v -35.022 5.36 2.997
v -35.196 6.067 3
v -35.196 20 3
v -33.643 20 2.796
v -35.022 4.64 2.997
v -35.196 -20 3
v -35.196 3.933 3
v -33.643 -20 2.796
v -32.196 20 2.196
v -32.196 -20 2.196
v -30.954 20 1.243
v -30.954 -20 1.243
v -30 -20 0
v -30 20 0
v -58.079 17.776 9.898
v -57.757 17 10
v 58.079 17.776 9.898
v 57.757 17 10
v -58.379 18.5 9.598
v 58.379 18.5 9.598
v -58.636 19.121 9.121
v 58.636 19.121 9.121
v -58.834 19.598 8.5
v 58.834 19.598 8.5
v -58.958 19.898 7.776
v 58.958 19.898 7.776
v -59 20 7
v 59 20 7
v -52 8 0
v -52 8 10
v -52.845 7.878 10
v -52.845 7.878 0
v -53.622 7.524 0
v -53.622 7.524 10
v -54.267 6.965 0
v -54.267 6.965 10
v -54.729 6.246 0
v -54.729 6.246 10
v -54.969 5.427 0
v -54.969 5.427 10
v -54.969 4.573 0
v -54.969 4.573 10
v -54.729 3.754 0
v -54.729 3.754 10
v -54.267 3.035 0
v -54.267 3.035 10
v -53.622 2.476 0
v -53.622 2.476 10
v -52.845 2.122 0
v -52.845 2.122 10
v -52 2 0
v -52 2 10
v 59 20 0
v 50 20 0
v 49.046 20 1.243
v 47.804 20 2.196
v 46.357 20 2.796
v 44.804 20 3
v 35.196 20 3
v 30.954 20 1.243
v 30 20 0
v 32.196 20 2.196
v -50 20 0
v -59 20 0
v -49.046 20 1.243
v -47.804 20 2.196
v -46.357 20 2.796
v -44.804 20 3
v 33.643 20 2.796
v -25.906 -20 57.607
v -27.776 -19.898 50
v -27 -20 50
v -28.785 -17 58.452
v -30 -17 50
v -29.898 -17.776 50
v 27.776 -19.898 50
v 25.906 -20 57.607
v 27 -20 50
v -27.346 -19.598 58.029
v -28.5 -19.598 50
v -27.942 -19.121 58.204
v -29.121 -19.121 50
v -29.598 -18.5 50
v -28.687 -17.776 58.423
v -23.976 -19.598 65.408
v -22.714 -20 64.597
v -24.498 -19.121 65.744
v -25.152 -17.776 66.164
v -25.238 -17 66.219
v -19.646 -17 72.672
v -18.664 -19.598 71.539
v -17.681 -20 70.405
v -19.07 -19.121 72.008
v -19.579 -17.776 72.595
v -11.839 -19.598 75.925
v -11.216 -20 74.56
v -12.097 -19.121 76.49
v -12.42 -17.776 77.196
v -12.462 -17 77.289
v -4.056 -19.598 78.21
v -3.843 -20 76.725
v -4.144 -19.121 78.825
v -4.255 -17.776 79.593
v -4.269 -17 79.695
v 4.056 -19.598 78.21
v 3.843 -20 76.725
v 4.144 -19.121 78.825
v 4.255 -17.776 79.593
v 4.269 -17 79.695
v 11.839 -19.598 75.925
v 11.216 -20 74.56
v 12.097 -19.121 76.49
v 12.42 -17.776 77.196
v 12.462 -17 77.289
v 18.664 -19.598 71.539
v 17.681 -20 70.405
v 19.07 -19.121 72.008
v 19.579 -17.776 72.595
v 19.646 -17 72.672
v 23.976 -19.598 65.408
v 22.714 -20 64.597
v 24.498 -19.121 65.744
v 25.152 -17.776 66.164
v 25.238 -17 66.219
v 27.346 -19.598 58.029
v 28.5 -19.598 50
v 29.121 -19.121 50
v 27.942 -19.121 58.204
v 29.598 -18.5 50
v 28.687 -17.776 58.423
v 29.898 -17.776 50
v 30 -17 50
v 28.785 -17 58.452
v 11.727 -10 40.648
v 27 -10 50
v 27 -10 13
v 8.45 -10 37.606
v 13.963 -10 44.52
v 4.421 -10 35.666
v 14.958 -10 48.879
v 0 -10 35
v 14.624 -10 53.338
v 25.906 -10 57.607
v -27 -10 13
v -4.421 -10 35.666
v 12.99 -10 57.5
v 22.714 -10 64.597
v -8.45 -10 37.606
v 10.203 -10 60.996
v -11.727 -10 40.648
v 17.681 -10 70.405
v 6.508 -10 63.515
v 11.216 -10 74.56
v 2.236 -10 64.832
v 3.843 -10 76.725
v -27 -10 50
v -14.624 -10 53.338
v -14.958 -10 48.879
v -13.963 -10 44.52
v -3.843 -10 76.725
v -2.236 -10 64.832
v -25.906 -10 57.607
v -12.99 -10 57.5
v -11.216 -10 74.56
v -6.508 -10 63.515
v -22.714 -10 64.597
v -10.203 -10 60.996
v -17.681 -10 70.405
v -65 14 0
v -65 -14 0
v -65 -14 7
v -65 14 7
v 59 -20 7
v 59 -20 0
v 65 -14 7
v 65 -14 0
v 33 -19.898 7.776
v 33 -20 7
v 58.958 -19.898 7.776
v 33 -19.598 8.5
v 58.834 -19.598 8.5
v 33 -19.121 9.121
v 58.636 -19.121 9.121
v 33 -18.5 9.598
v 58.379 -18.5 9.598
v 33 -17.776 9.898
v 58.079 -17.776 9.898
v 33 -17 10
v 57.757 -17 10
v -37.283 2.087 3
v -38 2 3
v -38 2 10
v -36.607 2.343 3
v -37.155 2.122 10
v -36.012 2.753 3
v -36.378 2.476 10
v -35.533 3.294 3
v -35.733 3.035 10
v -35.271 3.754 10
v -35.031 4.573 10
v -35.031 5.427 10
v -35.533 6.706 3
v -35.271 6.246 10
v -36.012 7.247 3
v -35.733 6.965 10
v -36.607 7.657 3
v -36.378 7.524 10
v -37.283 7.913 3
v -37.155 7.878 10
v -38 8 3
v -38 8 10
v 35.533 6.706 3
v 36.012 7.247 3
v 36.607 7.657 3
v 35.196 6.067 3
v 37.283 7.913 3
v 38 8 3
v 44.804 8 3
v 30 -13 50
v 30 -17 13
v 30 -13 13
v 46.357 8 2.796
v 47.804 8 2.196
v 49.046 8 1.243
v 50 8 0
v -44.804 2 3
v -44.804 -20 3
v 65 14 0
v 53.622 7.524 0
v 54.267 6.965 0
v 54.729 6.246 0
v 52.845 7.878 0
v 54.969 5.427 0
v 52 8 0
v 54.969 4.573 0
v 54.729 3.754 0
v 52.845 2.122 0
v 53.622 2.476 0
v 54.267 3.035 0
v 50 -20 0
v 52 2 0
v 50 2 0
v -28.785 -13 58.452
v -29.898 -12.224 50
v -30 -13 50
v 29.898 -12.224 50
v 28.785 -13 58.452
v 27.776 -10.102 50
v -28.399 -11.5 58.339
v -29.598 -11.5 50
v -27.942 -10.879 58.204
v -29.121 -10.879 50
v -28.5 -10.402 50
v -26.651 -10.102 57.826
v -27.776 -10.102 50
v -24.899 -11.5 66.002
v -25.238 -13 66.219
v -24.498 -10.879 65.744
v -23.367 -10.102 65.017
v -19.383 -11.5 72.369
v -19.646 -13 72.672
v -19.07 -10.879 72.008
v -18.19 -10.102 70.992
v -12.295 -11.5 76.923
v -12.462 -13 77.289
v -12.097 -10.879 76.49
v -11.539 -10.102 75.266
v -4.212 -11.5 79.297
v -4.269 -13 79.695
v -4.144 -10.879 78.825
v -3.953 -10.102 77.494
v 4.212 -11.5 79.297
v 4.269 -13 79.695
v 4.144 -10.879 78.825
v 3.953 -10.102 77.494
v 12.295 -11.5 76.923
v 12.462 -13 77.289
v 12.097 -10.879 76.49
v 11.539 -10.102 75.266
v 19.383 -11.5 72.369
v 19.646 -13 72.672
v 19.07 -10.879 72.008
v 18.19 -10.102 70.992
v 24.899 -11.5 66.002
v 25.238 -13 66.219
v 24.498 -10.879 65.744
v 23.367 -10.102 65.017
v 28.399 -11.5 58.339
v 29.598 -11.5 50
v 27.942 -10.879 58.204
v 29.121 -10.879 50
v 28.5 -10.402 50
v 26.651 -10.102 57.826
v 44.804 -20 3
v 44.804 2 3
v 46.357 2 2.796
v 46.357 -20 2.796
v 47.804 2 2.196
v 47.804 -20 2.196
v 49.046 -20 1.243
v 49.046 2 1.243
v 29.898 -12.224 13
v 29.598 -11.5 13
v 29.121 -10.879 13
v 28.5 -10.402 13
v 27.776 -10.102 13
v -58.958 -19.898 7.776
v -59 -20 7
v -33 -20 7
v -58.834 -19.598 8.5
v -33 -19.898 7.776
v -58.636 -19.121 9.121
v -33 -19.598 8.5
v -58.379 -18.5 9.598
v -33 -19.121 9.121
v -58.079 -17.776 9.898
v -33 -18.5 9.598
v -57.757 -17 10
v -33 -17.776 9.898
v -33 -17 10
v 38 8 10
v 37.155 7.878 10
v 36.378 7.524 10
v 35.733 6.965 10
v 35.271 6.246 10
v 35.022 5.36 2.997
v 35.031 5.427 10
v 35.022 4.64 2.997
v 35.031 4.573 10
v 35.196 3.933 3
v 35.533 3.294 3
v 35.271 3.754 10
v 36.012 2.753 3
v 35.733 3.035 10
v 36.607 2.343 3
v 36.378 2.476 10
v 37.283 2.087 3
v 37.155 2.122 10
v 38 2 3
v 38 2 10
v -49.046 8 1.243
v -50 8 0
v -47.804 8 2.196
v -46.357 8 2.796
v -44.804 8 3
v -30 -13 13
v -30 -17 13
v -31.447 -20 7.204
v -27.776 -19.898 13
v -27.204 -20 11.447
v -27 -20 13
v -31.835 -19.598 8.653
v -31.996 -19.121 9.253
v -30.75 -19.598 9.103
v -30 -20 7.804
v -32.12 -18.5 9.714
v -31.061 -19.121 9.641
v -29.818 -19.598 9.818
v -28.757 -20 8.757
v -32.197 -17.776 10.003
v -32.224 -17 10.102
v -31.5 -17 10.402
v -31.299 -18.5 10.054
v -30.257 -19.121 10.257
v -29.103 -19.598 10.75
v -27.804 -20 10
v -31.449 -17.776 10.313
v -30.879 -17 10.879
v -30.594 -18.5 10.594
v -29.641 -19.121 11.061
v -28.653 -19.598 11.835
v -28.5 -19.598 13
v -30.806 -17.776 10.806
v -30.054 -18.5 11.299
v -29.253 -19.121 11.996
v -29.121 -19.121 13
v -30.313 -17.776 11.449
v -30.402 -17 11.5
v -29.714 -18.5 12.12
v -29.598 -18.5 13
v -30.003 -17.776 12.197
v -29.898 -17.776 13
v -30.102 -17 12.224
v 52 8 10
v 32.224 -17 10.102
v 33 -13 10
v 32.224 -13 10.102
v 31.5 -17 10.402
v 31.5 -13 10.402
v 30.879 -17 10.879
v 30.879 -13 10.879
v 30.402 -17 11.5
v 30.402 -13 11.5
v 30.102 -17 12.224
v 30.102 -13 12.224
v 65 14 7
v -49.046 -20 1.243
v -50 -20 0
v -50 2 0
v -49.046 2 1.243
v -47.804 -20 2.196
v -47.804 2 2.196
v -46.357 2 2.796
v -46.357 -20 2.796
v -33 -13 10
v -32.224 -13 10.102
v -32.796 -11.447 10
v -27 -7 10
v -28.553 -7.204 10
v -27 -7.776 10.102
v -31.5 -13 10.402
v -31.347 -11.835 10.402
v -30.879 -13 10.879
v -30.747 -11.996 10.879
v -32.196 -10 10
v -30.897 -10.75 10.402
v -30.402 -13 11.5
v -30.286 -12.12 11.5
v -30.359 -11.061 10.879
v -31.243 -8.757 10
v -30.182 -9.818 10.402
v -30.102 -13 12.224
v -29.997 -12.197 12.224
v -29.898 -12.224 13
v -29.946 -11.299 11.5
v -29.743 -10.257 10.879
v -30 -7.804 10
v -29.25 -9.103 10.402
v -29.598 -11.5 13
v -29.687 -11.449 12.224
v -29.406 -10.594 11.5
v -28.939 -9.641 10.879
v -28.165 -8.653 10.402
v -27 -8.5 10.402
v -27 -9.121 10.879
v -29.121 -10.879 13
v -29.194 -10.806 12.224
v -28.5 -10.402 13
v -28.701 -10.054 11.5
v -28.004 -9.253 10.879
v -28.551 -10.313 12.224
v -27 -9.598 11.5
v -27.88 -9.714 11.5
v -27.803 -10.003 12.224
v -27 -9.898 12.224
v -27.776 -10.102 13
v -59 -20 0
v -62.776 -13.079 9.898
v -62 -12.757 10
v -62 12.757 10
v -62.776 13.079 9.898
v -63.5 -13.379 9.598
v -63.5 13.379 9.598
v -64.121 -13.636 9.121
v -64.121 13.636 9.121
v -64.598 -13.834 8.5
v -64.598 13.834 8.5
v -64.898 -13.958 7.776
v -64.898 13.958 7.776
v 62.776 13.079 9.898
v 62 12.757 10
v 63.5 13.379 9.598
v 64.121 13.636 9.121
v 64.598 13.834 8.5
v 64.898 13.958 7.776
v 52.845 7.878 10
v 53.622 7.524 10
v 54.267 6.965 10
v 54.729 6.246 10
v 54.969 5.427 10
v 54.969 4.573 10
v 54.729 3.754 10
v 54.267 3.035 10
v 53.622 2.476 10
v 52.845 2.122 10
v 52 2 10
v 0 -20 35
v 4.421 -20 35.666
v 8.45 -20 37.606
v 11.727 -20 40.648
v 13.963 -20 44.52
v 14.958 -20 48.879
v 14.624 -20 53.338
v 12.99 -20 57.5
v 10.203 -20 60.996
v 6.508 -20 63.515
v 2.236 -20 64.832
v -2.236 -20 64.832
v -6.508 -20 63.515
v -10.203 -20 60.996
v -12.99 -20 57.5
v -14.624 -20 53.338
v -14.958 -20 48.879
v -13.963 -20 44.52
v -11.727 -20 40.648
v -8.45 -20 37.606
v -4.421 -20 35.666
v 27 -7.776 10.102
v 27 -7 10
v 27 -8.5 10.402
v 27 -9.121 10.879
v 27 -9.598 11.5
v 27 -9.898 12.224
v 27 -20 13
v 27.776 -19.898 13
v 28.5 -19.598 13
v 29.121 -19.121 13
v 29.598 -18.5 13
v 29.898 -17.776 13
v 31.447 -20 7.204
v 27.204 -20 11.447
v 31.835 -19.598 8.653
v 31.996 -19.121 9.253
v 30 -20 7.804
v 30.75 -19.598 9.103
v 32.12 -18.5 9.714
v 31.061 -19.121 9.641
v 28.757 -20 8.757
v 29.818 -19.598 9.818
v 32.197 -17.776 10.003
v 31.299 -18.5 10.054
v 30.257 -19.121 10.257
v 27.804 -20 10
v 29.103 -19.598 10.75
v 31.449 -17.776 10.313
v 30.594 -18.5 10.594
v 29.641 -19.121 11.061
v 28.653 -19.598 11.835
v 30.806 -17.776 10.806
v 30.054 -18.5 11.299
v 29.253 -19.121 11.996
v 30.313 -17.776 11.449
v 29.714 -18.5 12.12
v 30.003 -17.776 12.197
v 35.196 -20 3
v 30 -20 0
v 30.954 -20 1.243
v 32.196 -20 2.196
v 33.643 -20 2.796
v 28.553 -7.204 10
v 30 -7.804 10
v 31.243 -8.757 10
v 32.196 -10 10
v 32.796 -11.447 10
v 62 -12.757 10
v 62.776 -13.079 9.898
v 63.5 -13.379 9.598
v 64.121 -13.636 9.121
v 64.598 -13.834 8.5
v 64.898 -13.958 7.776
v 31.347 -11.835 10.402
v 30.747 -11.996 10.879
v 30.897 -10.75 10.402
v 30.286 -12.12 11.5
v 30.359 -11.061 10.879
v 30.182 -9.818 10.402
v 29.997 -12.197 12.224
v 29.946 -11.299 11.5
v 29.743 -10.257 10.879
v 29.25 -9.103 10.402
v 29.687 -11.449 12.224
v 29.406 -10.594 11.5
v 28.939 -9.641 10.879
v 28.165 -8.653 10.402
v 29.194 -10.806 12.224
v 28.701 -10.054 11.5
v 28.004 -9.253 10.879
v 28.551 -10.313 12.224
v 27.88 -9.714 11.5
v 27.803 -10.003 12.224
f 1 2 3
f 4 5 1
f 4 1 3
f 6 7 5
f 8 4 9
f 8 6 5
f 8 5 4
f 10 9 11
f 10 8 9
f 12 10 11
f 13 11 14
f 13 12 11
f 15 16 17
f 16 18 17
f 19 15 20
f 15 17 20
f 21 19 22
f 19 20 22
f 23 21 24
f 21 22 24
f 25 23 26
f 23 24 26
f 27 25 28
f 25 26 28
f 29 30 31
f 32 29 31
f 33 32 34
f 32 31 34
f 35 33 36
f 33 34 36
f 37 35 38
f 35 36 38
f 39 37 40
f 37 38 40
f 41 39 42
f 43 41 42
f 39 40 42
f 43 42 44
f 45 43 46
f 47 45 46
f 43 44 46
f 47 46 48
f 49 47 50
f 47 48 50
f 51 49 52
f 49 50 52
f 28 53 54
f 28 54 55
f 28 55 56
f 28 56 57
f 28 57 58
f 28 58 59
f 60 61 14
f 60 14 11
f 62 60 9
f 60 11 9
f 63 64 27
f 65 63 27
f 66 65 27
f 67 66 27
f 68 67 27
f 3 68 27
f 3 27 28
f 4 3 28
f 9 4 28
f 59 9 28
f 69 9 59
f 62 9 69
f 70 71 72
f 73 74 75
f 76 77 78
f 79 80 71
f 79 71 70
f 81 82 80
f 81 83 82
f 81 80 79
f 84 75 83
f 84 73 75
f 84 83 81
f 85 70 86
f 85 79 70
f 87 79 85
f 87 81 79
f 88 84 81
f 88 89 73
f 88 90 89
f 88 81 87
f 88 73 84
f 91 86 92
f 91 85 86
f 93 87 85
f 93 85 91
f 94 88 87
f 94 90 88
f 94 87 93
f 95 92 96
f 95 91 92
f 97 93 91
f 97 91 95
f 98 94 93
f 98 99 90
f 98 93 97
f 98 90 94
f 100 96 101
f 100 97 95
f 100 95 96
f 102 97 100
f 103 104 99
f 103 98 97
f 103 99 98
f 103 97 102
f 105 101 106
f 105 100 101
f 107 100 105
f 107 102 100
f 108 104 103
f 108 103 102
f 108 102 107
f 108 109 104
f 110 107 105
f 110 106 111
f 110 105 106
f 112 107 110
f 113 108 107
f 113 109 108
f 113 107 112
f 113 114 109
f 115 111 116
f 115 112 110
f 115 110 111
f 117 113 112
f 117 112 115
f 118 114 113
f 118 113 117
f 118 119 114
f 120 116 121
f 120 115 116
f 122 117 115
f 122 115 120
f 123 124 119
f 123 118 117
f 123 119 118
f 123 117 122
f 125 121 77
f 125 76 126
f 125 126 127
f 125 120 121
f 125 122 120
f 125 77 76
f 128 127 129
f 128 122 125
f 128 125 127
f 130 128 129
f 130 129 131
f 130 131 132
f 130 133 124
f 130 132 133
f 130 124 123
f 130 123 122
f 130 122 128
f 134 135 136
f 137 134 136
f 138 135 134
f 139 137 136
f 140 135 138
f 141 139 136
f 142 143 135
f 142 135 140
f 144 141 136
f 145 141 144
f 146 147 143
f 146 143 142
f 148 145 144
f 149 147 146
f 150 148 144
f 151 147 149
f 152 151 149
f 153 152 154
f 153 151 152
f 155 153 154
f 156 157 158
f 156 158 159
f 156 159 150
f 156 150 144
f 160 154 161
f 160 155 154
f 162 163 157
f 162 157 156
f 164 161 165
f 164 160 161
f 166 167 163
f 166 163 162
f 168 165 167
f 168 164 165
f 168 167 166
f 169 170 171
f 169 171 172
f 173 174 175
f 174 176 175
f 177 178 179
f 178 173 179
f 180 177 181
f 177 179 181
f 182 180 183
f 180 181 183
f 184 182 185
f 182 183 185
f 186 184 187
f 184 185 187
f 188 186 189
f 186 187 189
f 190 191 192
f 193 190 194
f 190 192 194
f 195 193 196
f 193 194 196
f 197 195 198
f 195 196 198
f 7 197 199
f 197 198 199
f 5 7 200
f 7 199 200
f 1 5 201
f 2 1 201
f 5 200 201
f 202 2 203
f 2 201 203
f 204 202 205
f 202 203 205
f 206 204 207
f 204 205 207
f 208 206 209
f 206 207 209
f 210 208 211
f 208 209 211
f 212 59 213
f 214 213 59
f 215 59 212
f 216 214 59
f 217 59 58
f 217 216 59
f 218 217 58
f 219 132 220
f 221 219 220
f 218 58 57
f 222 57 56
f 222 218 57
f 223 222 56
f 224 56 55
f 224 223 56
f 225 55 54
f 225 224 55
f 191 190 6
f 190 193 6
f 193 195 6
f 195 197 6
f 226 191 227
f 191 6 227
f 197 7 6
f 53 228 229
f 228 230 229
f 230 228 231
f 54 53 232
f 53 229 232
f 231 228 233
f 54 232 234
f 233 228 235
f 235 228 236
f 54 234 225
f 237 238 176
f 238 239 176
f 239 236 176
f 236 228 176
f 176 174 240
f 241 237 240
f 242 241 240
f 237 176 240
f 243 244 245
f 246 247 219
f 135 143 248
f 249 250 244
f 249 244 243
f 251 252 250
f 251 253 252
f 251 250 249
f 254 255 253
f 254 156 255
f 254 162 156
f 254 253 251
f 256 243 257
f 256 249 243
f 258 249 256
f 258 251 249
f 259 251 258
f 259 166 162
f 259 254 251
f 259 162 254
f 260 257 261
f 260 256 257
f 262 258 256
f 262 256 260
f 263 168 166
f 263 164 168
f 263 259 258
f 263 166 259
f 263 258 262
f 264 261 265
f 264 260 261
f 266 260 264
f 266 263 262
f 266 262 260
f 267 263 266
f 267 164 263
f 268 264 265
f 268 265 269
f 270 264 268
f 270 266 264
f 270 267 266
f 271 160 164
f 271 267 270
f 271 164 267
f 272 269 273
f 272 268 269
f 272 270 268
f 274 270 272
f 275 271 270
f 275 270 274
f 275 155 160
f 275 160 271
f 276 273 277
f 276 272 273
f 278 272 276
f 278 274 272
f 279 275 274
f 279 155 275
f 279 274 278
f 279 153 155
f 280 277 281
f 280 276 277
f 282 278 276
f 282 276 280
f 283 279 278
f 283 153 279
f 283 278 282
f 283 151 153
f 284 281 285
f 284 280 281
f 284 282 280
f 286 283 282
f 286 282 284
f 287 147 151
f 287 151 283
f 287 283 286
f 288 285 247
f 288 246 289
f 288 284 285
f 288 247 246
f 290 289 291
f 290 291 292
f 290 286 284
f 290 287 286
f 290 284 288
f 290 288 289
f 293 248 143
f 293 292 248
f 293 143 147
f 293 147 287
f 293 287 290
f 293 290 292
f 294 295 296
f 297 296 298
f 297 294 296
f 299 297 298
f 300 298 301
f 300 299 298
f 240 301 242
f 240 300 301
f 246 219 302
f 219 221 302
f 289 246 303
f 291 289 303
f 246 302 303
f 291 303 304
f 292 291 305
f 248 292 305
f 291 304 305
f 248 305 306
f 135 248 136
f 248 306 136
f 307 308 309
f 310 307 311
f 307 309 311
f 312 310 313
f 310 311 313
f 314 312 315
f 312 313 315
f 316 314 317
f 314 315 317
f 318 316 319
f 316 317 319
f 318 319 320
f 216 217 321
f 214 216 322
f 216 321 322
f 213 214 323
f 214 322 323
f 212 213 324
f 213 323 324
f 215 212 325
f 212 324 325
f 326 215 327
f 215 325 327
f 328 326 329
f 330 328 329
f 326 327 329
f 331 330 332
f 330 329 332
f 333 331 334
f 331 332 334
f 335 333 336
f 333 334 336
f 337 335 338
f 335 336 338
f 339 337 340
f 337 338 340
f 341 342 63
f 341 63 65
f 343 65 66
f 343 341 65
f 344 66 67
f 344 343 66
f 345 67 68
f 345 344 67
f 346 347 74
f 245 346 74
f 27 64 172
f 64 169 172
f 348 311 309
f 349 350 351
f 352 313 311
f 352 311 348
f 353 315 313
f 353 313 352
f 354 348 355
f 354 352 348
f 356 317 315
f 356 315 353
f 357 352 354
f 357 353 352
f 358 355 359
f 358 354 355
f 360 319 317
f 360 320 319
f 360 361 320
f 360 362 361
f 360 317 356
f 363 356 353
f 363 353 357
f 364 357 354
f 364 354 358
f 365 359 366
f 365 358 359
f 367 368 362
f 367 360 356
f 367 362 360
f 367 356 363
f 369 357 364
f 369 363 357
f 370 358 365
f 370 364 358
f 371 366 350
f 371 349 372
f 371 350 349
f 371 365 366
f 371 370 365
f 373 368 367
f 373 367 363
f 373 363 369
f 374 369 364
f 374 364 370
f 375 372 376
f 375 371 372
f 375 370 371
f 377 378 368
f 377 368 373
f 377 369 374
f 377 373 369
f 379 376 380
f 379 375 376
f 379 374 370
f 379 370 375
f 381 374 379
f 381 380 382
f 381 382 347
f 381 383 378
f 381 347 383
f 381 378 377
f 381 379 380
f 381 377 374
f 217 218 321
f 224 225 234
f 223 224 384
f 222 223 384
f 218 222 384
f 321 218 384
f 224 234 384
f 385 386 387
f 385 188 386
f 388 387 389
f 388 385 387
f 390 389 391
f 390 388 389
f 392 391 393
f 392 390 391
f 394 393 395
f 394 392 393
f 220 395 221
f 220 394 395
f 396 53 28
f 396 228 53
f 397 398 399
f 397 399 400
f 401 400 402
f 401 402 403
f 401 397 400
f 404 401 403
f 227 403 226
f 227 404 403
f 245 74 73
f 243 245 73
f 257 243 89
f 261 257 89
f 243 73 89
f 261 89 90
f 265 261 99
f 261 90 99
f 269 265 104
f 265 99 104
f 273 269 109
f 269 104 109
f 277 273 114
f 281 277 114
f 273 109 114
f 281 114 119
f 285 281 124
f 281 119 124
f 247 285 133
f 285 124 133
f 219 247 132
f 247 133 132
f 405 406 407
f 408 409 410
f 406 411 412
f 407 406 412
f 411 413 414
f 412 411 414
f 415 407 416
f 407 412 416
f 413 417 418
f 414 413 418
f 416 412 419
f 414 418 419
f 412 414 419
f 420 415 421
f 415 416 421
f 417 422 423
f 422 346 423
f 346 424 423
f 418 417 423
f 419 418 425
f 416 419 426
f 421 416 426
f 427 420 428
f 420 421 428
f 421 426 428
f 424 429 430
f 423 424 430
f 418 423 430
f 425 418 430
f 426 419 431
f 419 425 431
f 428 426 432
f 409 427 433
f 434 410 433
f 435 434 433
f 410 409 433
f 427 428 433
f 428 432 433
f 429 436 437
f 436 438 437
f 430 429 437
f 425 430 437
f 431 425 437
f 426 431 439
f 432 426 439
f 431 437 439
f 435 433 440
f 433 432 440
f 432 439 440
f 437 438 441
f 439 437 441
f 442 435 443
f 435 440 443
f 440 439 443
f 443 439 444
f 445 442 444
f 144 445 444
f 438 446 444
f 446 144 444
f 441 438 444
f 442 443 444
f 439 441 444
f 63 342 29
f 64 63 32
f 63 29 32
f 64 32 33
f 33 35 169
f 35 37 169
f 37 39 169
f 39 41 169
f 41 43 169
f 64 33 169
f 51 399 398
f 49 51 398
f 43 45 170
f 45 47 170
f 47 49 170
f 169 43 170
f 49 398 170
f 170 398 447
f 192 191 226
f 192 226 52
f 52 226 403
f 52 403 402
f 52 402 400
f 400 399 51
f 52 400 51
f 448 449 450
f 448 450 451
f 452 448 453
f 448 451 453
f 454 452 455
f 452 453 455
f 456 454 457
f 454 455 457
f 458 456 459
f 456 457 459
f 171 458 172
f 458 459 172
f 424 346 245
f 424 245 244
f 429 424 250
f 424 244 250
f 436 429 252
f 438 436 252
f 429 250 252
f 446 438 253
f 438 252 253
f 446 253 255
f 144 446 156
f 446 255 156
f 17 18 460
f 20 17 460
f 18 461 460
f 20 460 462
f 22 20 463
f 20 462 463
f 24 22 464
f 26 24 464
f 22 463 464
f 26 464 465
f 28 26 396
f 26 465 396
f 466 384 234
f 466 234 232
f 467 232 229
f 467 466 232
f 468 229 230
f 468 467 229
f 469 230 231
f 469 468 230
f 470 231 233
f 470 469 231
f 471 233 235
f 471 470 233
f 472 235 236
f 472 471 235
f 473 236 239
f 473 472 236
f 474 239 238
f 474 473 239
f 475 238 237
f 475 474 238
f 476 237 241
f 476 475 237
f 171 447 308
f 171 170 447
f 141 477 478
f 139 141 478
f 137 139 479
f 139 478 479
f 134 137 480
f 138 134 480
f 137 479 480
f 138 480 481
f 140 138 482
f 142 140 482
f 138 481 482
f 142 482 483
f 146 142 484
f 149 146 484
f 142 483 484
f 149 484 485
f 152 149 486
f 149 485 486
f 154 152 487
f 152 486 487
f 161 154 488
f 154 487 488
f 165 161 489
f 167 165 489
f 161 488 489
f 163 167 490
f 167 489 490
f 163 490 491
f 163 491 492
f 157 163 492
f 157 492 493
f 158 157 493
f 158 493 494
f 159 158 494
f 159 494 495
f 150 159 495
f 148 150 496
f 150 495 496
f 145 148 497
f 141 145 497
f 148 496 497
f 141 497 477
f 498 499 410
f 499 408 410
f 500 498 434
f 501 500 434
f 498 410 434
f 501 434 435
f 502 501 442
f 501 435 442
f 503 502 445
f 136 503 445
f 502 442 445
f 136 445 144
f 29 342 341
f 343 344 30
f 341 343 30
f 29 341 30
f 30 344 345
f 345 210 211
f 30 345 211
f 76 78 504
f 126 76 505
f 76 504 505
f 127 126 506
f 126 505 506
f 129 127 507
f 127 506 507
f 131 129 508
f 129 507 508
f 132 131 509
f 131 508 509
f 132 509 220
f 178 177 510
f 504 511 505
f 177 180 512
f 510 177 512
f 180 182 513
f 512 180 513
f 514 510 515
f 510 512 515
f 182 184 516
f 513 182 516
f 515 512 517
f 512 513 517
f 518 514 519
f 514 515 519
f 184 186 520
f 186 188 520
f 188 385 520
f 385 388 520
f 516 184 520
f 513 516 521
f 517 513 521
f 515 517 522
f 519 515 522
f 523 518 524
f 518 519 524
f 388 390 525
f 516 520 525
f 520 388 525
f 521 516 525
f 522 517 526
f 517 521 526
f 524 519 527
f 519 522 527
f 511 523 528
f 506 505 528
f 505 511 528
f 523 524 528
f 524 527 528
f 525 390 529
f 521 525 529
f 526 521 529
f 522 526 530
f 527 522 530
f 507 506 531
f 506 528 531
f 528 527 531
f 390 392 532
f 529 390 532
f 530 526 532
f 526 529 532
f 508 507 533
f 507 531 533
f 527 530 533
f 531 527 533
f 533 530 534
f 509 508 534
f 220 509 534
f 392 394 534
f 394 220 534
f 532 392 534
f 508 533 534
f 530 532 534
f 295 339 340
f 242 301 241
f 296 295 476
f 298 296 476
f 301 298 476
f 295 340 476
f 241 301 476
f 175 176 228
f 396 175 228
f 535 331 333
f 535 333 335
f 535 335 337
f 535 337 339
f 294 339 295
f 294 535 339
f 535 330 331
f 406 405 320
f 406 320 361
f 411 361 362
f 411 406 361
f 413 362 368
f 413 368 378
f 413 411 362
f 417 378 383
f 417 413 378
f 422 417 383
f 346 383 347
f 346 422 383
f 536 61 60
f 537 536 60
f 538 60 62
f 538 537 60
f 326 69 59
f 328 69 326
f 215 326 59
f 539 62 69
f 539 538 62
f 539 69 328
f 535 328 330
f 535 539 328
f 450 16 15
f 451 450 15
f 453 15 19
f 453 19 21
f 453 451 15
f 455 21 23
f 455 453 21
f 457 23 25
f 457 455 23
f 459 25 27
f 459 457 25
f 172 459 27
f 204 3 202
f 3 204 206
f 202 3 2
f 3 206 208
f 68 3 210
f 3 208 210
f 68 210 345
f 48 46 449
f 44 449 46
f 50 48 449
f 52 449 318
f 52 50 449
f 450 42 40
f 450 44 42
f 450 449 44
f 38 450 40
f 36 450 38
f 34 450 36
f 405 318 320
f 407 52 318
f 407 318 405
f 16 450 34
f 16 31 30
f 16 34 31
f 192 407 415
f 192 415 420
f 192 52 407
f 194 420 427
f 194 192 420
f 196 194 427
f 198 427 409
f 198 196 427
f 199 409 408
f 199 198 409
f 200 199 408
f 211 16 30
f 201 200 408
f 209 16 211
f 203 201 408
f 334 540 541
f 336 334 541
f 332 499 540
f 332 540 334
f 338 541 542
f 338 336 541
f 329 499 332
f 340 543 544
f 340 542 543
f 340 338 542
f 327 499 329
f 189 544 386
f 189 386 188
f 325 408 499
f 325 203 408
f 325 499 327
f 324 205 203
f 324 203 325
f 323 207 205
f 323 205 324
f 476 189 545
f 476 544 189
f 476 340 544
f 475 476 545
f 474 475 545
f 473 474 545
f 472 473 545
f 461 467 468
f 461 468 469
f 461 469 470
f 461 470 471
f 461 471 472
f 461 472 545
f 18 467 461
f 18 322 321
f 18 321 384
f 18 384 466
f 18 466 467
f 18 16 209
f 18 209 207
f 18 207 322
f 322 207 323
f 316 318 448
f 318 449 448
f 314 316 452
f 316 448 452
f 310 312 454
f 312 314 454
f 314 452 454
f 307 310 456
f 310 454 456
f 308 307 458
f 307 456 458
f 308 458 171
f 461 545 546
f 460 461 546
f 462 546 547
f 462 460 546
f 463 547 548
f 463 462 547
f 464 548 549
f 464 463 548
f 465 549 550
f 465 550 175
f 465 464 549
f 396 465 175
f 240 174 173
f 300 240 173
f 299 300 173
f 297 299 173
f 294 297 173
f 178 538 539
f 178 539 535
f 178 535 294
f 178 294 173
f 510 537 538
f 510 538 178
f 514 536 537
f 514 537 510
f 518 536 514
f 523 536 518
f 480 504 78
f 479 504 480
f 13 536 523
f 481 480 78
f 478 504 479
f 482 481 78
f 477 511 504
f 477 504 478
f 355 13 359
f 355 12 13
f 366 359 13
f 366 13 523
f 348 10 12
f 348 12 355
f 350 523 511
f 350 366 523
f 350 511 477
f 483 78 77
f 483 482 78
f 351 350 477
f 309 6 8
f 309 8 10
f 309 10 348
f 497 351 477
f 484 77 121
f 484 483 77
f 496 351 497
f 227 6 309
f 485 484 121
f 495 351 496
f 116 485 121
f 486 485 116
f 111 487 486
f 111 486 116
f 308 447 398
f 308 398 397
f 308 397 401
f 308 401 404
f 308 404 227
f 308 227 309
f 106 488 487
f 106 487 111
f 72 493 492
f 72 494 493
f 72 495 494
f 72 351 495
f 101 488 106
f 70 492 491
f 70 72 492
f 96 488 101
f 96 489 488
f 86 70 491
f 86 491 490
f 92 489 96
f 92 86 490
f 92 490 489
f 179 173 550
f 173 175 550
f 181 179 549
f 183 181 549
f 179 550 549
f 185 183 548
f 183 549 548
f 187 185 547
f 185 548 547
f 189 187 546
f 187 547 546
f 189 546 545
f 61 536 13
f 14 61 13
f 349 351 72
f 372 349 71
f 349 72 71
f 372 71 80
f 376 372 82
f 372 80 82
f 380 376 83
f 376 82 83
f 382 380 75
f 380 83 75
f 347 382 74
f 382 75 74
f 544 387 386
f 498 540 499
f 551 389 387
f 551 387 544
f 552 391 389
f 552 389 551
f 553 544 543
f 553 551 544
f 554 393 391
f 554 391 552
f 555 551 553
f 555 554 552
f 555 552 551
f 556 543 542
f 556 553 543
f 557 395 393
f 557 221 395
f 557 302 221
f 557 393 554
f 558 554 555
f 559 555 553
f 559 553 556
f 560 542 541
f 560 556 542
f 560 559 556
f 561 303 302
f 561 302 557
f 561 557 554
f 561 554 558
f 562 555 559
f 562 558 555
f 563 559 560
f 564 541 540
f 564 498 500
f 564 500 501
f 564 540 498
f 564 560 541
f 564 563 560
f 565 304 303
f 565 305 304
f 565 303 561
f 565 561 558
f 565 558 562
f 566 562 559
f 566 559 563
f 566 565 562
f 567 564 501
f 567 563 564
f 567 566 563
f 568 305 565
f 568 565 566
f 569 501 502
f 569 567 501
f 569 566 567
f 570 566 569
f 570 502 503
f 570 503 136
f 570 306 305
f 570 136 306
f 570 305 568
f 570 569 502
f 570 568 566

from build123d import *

# Parameters (mm, degrees)
ESQUISSE1_W             = 130
ESQUISSE1_H             = 40
BOSS_EXTRU_1_DEPTH      = 10
ESQUISSE2_R             = 15
BOSS_EXTRU_2_DEPTH      = 10
ENL_V_MAT_EXTRU_1_DEPTH = 98.59610648
ESQUISSE4_W             = 20
ESQUISSE4_H             = 3
ENL_V_MAT_EXTRU_2_DEPTH = 111.566721937
CONG_1_R                = 6
CONG_1_OF_SYM_TRIE2_R   = 6
CHANFREIN1_SIZE         = 6
CONG_2_R                = 3


with BuildPart() as part:
    # Esquisse1 → Boss.-Extru.1 (new body)
    with BuildSketch(Plane.XY):
        Rectangle(ESQUISSE1_W, ESQUISSE1_H)
    extrude(amount=BOSS_EXTRU_1_DEPTH)

    # Esquisse2 → Boss.-Extru.2 (add)
    with BuildSketch(Plane.XZ.offset(20)):
        with BuildLine():
            Line((-30, 0), (-30, 50))
            ThreePointArc((-30, 50), (0, 80), (30, 50))
            Line((30, 50), (30, 0))
            Line((30, 0), (-30, 0))
        make_face()
        with Locations(Location((0, 50, 0), (0, 0, 270))):
            Circle(ESQUISSE2_R, mode=Mode.SUBTRACT)
    extrude(amount=-BOSS_EXTRU_2_DEPTH)

    # Esquisse3 → Enlèv. mat.-Extru.1 (cut, through all)
    with BuildSketch(Plane.XY.offset(10)):
        with BuildLine():
            Line((38, 8), (52, 8))
            ThreePointArc((52, 8), (55, 5), (52, 2))
            Line((52, 2), (38, 2))
            ThreePointArc((38, 2), (35, 5), (38, 8))
        make_face()
    enl_v_mat_extru_1 = extrude(amount=-ENL_V_MAT_EXTRU_1_DEPTH, mode=Mode.SUBTRACT)

    # Symétrie1: Enlèv. mat.-Extru.1 across plane
    add(enl_v_mat_extru_1.mirror(Plane(origin=(0, 0, 0), x_dir=(0, 0, 1), z_dir=(1, 0, 0))), mode=Mode.SUBTRACT)

    # Esquisse4 → Enlèv. mat.-Extru.2 (cut, through all)
    with BuildSketch(Plane.XZ.offset(20)):
        with Locations((40, 1.5)):
            Rectangle(ESQUISSE4_W, ESQUISSE4_H)
    enl_v_mat_extru_2 = extrude(amount=-ENL_V_MAT_EXTRU_2_DEPTH, mode=Mode.SUBTRACT)

    # Congé1
    # the kernel refuses this fillet: 6 mm, written as the material it adds along each edge
    with BuildSketch(Plane(origin=(50, -20, 3), x_dir=(-1, 0, 0), z_dir=(0, 1, 0))) as cong_1_piece_1:
        with BuildLine():
            CenterArc((5.196152423, -6), CONG_1_R, 90, 60)
            Line((0, -3), (-0.103923048, -2.94))
            ThreePointArc((-0.103923048, -2.94), (-0.12, -1.5), (-0.12, 0))
            Line((-0.12, 0), (0, 0.12))
            Line((0, 0.12), (5.196152423, 0.12))
            Line((5.196152423, 0.12), (5.196152423, 0))
        make_face()
    extrude(amount=22)
    with BuildSketch(Plane(origin=(50, -20, 3), x_dir=(-1, 0, 0), z_dir=(0, 1, 0))) as cong_1_piece_2_section:
        with BuildLine():
            CenterArc((5.196152423, -6), CONG_1_R, 90, 60)
            Line((0, -3), (-0.103923048, -2.94))
            ThreePointArc((-0.103923048, -2.94), (-0.12, -1.5), (-0.12, 0))
            Line((-0.12, 0), (0, 0.12))
            Line((0, 0.12), (5.196152423, 0.12))
            Line((5.196152423, 0.12), (5.196152423, 0))
        make_face()
    cong_1_piece_2 = extrude(amount=34.990381057, mode=Mode.PRIVATE)
    cong_1_piece_2 = split(cong_1_piece_2, bisect_by=Plane(origin=(48.702137325, 8, 2.222899734), z_dir=(0, 1, 0)), keep=Keep.TOP, mode=Mode.PRIVATE)
    add(cong_1_piece_2)
    with BuildSketch(Plane(origin=(50, -4.990381057, 3), x_dir=(-1, 0, 0), z_dir=(0, 1, 0))) as cong_1_piece_3_section:
        with BuildLine():
            CenterArc((5.196152423, -6), CONG_1_R, 90, 60)
            Line((0, -3), (-0.103923048, -2.94))
            ThreePointArc((-0.103923048, -2.94), (-0.12, -1.5), (-0.12, 0))
            Line((-0.12, 0), (0, 0.12))
            Line((0, 0.12), (5.196152423, 0.12))
            Line((5.196152423, 0.12), (5.196152423, 0))
        make_face()
    cong_1_piece_3 = extrude(amount=24.990381057, mode=Mode.PRIVATE)
    cong_1_piece_3 = split(cong_1_piece_3, bisect_by=Plane(origin=(48.702137325, 2, 2.222899734), z_dir=(0, -1, 0)), keep=Keep.TOP, mode=Mode.PRIVATE)
    add(cong_1_piece_3)
    with BuildSketch(Plane(origin=(50, 8, 3), x_dir=(-1, 0, 0), z_dir=(0, 1, 0))) as cong_1_piece_4:
        with BuildLine():
            CenterArc((5.196152423, -6), CONG_1_R, 90, 60)
            Line((0, -3), (-0.103923048, -2.94))
            ThreePointArc((-0.103923048, -2.94), (-0.12, -1.5), (-0.12, 0))
            Line((-0.12, 0), (0, 0.12))
            Line((0, 0.12), (5.196152423, 0.12))
            Line((5.196152423, 0.12), (5.196152423, 0))
        make_face()
    extrude(amount=12)
    with BuildSketch(Plane(origin=(30, -20, 3), x_dir=(0, 0, -1), z_dir=(0, 1, 0))) as cong_1_piece_5_section:
        with BuildLine():
            CenterArc((6, -5.196152423), CONG_1_R, 120, 60)
            Line((0, -5.196152423), (-0.12, -5.196152423))
            Line((-0.12, -5.196152423), (-0.12, 0))
            Line((-0.12, 0), (0, 0.12))
            ThreePointArc((0, 0.12), (1.5, 0.12), (2.94, 0.103923048))
            Line((2.94, 0.103923048), (3, 0))
        make_face()
    cong_1_piece_5 = extrude(amount=40, mode=Mode.PRIVATE)
    cong_1_piece_5 = cong_1_piece_5 - Plane(origin=(38, 5, 2.222770997), x_dir=(0, -1, 0), z_dir=(0, 0, 1)) * Cylinder(3, 101, mode=Mode.PRIVATE)
    add(cong_1_piece_5)

    # Symétrie2: Enlèv. mat.-Extru.2 across plane
    add(enl_v_mat_extru_2.mirror(Plane(origin=(0, 0, 0), x_dir=(0, 0, 1), z_dir=(1, 0, 0))), mode=Mode.SUBTRACT)

    # Congé1 of Symétrie2
    # the kernel refuses this fillet: 6 mm, written as the material it adds along each edge
    with BuildSketch(Plane(origin=(-50, -20, 3), x_dir=(1, 0, 0), z_dir=(0, 1, 0))) as cong_1_of_sym_trie2_piece_1:
        with BuildLine():
            CenterArc((5.196152423, 6), CONG_1_OF_SYM_TRIE2_R, 210, 60)
            Line((0, 3), (-0.103923048, 2.94))
            ThreePointArc((-0.103923048, 2.94), (-0.12, 1.5), (-0.12, 0))
            Line((-0.12, 0), (0, -0.12))
            Line((0, -0.12), (5.196152423, -0.12))
            Line((5.196152423, -0.12), (5.196152423, 0))
        make_face()
    extrude(amount=22)
    with BuildSketch(Plane(origin=(-50, -20, 3), x_dir=(1, 0, 0), z_dir=(0, 1, 0))) as cong_1_of_sym_trie2_piece_2_section:
        with BuildLine():
            CenterArc((5.196152423, 6), CONG_1_OF_SYM_TRIE2_R, 210, 60)
            Line((0, 3), (-0.103923048, 2.94))
            ThreePointArc((-0.103923048, 2.94), (-0.12, 1.5), (-0.12, 0))
            Line((-0.12, 0), (0, -0.12))
            Line((0, -0.12), (5.196152423, -0.12))
            Line((5.196152423, -0.12), (5.196152423, 0))
        make_face()
    cong_1_of_sym_trie2_piece_2 = extrude(amount=34.990381057, mode=Mode.PRIVATE)
    cong_1_of_sym_trie2_piece_2 = split(cong_1_of_sym_trie2_piece_2, bisect_by=Plane(origin=(-48.702137325, 8, 2.222899734), z_dir=(0, 1, 0)), keep=Keep.TOP, mode=Mode.PRIVATE)
    add(cong_1_of_sym_trie2_piece_2)
    with BuildSketch(Plane(origin=(-50, -4.990381057, 3), x_dir=(1, 0, 0), z_dir=(0, 1, 0))) as cong_1_of_sym_trie2_piece_3_section:
        with BuildLine():
            CenterArc((5.196152423, 6), CONG_1_OF_SYM_TRIE2_R, 210, 60)
            Line((0, 3), (-0.103923048, 2.94))
            ThreePointArc((-0.103923048, 2.94), (-0.12, 1.5), (-0.12, 0))
            Line((-0.12, 0), (0, -0.12))
            Line((0, -0.12), (5.196152423, -0.12))
            Line((5.196152423, -0.12), (5.196152423, 0))
        make_face()
    cong_1_of_sym_trie2_piece_3 = extrude(amount=24.990381057, mode=Mode.PRIVATE)
    cong_1_of_sym_trie2_piece_3 = split(cong_1_of_sym_trie2_piece_3, bisect_by=Plane(origin=(-48.702137325, 2, 2.222899734), z_dir=(0, -1, 0)), keep=Keep.TOP, mode=Mode.PRIVATE)
    add(cong_1_of_sym_trie2_piece_3)
    with BuildSketch(Plane(origin=(-50, 8, 3), x_dir=(1, 0, 0), z_dir=(0, 1, 0))) as cong_1_of_sym_trie2_piece_4:
        with BuildLine():
            CenterArc((5.196152423, 6), CONG_1_OF_SYM_TRIE2_R, 210, 60)
            Line((0, 3), (-0.103923048, 2.94))
            ThreePointArc((-0.103923048, 2.94), (-0.12, 1.5), (-0.12, 0))
            Line((-0.12, 0), (0, -0.12))
            Line((0, -0.12), (5.196152423, -0.12))
            Line((5.196152423, -0.12), (5.196152423, 0))
        make_face()
    extrude(amount=12)
    with BuildSketch(Plane(origin=(-30, -20, 3), x_dir=(0, 0, -1), z_dir=(0, 1, 0))) as cong_1_of_sym_trie2_piece_5_section:
        with BuildLine():
            CenterArc((6, 5.196152423), CONG_1_OF_SYM_TRIE2_R, 180, 60)
            Line((0, 5.196152423), (-0.12, 5.196152423))
            Line((-0.12, 5.196152423), (-0.12, 0))
            Line((-0.12, 0), (0, -0.12))
            ThreePointArc((0, -0.12), (1.5, -0.12), (2.94, -0.103923048))
            Line((2.94, -0.103923048), (3, 0))
        make_face()
    cong_1_of_sym_trie2_piece_5 = extrude(amount=40, mode=Mode.PRIVATE)
    cong_1_of_sym_trie2_piece_5 = cong_1_of_sym_trie2_piece_5 - Plane(origin=(-38, 5, 2.222770997), x_dir=(0, -1, 0), z_dir=(0, 0, 1)) * Cylinder(3, 101, mode=Mode.PRIVATE)
    add(cong_1_of_sym_trie2_piece_5)

    # Chanfrein1
    chanfrein1_edges = [part.edges().sort_by_distance(p)[0] for p in [
        (-65, -20, 5),
        (65, -20, 5),
        (65, 20, 5),
        (-65, 20, 5),
    ]]
    chamfer(chanfrein1_edges, length=CHANFREIN1_SIZE)

    # Congé2
    cong_2_edges = [part.edges().sort_by_distance(p)[0] for p in [
        (-65, 0, 10),
        (0, 20, 10),
        (-44.5, -20, 10),
        (65, 0, 10),
        (-62, -17, 10),
        (62, -17, 10),
        (62, 17, 10),
        (-62, 17, 10),
        (44.5, -20, 10),
        (-30, -10, 30),
        (30, -10, 30),
        (-30, -20, 30),
        (30, -20, 30),
        (0, -20, 80),
        (-30, -15, 10),
        (0, -10, 80),
        (30, -15, 10),
        (0, -10, 10),
    ]]
    fillet(cong_2_edges, radius=CONG_2_R)


solid = part.part
